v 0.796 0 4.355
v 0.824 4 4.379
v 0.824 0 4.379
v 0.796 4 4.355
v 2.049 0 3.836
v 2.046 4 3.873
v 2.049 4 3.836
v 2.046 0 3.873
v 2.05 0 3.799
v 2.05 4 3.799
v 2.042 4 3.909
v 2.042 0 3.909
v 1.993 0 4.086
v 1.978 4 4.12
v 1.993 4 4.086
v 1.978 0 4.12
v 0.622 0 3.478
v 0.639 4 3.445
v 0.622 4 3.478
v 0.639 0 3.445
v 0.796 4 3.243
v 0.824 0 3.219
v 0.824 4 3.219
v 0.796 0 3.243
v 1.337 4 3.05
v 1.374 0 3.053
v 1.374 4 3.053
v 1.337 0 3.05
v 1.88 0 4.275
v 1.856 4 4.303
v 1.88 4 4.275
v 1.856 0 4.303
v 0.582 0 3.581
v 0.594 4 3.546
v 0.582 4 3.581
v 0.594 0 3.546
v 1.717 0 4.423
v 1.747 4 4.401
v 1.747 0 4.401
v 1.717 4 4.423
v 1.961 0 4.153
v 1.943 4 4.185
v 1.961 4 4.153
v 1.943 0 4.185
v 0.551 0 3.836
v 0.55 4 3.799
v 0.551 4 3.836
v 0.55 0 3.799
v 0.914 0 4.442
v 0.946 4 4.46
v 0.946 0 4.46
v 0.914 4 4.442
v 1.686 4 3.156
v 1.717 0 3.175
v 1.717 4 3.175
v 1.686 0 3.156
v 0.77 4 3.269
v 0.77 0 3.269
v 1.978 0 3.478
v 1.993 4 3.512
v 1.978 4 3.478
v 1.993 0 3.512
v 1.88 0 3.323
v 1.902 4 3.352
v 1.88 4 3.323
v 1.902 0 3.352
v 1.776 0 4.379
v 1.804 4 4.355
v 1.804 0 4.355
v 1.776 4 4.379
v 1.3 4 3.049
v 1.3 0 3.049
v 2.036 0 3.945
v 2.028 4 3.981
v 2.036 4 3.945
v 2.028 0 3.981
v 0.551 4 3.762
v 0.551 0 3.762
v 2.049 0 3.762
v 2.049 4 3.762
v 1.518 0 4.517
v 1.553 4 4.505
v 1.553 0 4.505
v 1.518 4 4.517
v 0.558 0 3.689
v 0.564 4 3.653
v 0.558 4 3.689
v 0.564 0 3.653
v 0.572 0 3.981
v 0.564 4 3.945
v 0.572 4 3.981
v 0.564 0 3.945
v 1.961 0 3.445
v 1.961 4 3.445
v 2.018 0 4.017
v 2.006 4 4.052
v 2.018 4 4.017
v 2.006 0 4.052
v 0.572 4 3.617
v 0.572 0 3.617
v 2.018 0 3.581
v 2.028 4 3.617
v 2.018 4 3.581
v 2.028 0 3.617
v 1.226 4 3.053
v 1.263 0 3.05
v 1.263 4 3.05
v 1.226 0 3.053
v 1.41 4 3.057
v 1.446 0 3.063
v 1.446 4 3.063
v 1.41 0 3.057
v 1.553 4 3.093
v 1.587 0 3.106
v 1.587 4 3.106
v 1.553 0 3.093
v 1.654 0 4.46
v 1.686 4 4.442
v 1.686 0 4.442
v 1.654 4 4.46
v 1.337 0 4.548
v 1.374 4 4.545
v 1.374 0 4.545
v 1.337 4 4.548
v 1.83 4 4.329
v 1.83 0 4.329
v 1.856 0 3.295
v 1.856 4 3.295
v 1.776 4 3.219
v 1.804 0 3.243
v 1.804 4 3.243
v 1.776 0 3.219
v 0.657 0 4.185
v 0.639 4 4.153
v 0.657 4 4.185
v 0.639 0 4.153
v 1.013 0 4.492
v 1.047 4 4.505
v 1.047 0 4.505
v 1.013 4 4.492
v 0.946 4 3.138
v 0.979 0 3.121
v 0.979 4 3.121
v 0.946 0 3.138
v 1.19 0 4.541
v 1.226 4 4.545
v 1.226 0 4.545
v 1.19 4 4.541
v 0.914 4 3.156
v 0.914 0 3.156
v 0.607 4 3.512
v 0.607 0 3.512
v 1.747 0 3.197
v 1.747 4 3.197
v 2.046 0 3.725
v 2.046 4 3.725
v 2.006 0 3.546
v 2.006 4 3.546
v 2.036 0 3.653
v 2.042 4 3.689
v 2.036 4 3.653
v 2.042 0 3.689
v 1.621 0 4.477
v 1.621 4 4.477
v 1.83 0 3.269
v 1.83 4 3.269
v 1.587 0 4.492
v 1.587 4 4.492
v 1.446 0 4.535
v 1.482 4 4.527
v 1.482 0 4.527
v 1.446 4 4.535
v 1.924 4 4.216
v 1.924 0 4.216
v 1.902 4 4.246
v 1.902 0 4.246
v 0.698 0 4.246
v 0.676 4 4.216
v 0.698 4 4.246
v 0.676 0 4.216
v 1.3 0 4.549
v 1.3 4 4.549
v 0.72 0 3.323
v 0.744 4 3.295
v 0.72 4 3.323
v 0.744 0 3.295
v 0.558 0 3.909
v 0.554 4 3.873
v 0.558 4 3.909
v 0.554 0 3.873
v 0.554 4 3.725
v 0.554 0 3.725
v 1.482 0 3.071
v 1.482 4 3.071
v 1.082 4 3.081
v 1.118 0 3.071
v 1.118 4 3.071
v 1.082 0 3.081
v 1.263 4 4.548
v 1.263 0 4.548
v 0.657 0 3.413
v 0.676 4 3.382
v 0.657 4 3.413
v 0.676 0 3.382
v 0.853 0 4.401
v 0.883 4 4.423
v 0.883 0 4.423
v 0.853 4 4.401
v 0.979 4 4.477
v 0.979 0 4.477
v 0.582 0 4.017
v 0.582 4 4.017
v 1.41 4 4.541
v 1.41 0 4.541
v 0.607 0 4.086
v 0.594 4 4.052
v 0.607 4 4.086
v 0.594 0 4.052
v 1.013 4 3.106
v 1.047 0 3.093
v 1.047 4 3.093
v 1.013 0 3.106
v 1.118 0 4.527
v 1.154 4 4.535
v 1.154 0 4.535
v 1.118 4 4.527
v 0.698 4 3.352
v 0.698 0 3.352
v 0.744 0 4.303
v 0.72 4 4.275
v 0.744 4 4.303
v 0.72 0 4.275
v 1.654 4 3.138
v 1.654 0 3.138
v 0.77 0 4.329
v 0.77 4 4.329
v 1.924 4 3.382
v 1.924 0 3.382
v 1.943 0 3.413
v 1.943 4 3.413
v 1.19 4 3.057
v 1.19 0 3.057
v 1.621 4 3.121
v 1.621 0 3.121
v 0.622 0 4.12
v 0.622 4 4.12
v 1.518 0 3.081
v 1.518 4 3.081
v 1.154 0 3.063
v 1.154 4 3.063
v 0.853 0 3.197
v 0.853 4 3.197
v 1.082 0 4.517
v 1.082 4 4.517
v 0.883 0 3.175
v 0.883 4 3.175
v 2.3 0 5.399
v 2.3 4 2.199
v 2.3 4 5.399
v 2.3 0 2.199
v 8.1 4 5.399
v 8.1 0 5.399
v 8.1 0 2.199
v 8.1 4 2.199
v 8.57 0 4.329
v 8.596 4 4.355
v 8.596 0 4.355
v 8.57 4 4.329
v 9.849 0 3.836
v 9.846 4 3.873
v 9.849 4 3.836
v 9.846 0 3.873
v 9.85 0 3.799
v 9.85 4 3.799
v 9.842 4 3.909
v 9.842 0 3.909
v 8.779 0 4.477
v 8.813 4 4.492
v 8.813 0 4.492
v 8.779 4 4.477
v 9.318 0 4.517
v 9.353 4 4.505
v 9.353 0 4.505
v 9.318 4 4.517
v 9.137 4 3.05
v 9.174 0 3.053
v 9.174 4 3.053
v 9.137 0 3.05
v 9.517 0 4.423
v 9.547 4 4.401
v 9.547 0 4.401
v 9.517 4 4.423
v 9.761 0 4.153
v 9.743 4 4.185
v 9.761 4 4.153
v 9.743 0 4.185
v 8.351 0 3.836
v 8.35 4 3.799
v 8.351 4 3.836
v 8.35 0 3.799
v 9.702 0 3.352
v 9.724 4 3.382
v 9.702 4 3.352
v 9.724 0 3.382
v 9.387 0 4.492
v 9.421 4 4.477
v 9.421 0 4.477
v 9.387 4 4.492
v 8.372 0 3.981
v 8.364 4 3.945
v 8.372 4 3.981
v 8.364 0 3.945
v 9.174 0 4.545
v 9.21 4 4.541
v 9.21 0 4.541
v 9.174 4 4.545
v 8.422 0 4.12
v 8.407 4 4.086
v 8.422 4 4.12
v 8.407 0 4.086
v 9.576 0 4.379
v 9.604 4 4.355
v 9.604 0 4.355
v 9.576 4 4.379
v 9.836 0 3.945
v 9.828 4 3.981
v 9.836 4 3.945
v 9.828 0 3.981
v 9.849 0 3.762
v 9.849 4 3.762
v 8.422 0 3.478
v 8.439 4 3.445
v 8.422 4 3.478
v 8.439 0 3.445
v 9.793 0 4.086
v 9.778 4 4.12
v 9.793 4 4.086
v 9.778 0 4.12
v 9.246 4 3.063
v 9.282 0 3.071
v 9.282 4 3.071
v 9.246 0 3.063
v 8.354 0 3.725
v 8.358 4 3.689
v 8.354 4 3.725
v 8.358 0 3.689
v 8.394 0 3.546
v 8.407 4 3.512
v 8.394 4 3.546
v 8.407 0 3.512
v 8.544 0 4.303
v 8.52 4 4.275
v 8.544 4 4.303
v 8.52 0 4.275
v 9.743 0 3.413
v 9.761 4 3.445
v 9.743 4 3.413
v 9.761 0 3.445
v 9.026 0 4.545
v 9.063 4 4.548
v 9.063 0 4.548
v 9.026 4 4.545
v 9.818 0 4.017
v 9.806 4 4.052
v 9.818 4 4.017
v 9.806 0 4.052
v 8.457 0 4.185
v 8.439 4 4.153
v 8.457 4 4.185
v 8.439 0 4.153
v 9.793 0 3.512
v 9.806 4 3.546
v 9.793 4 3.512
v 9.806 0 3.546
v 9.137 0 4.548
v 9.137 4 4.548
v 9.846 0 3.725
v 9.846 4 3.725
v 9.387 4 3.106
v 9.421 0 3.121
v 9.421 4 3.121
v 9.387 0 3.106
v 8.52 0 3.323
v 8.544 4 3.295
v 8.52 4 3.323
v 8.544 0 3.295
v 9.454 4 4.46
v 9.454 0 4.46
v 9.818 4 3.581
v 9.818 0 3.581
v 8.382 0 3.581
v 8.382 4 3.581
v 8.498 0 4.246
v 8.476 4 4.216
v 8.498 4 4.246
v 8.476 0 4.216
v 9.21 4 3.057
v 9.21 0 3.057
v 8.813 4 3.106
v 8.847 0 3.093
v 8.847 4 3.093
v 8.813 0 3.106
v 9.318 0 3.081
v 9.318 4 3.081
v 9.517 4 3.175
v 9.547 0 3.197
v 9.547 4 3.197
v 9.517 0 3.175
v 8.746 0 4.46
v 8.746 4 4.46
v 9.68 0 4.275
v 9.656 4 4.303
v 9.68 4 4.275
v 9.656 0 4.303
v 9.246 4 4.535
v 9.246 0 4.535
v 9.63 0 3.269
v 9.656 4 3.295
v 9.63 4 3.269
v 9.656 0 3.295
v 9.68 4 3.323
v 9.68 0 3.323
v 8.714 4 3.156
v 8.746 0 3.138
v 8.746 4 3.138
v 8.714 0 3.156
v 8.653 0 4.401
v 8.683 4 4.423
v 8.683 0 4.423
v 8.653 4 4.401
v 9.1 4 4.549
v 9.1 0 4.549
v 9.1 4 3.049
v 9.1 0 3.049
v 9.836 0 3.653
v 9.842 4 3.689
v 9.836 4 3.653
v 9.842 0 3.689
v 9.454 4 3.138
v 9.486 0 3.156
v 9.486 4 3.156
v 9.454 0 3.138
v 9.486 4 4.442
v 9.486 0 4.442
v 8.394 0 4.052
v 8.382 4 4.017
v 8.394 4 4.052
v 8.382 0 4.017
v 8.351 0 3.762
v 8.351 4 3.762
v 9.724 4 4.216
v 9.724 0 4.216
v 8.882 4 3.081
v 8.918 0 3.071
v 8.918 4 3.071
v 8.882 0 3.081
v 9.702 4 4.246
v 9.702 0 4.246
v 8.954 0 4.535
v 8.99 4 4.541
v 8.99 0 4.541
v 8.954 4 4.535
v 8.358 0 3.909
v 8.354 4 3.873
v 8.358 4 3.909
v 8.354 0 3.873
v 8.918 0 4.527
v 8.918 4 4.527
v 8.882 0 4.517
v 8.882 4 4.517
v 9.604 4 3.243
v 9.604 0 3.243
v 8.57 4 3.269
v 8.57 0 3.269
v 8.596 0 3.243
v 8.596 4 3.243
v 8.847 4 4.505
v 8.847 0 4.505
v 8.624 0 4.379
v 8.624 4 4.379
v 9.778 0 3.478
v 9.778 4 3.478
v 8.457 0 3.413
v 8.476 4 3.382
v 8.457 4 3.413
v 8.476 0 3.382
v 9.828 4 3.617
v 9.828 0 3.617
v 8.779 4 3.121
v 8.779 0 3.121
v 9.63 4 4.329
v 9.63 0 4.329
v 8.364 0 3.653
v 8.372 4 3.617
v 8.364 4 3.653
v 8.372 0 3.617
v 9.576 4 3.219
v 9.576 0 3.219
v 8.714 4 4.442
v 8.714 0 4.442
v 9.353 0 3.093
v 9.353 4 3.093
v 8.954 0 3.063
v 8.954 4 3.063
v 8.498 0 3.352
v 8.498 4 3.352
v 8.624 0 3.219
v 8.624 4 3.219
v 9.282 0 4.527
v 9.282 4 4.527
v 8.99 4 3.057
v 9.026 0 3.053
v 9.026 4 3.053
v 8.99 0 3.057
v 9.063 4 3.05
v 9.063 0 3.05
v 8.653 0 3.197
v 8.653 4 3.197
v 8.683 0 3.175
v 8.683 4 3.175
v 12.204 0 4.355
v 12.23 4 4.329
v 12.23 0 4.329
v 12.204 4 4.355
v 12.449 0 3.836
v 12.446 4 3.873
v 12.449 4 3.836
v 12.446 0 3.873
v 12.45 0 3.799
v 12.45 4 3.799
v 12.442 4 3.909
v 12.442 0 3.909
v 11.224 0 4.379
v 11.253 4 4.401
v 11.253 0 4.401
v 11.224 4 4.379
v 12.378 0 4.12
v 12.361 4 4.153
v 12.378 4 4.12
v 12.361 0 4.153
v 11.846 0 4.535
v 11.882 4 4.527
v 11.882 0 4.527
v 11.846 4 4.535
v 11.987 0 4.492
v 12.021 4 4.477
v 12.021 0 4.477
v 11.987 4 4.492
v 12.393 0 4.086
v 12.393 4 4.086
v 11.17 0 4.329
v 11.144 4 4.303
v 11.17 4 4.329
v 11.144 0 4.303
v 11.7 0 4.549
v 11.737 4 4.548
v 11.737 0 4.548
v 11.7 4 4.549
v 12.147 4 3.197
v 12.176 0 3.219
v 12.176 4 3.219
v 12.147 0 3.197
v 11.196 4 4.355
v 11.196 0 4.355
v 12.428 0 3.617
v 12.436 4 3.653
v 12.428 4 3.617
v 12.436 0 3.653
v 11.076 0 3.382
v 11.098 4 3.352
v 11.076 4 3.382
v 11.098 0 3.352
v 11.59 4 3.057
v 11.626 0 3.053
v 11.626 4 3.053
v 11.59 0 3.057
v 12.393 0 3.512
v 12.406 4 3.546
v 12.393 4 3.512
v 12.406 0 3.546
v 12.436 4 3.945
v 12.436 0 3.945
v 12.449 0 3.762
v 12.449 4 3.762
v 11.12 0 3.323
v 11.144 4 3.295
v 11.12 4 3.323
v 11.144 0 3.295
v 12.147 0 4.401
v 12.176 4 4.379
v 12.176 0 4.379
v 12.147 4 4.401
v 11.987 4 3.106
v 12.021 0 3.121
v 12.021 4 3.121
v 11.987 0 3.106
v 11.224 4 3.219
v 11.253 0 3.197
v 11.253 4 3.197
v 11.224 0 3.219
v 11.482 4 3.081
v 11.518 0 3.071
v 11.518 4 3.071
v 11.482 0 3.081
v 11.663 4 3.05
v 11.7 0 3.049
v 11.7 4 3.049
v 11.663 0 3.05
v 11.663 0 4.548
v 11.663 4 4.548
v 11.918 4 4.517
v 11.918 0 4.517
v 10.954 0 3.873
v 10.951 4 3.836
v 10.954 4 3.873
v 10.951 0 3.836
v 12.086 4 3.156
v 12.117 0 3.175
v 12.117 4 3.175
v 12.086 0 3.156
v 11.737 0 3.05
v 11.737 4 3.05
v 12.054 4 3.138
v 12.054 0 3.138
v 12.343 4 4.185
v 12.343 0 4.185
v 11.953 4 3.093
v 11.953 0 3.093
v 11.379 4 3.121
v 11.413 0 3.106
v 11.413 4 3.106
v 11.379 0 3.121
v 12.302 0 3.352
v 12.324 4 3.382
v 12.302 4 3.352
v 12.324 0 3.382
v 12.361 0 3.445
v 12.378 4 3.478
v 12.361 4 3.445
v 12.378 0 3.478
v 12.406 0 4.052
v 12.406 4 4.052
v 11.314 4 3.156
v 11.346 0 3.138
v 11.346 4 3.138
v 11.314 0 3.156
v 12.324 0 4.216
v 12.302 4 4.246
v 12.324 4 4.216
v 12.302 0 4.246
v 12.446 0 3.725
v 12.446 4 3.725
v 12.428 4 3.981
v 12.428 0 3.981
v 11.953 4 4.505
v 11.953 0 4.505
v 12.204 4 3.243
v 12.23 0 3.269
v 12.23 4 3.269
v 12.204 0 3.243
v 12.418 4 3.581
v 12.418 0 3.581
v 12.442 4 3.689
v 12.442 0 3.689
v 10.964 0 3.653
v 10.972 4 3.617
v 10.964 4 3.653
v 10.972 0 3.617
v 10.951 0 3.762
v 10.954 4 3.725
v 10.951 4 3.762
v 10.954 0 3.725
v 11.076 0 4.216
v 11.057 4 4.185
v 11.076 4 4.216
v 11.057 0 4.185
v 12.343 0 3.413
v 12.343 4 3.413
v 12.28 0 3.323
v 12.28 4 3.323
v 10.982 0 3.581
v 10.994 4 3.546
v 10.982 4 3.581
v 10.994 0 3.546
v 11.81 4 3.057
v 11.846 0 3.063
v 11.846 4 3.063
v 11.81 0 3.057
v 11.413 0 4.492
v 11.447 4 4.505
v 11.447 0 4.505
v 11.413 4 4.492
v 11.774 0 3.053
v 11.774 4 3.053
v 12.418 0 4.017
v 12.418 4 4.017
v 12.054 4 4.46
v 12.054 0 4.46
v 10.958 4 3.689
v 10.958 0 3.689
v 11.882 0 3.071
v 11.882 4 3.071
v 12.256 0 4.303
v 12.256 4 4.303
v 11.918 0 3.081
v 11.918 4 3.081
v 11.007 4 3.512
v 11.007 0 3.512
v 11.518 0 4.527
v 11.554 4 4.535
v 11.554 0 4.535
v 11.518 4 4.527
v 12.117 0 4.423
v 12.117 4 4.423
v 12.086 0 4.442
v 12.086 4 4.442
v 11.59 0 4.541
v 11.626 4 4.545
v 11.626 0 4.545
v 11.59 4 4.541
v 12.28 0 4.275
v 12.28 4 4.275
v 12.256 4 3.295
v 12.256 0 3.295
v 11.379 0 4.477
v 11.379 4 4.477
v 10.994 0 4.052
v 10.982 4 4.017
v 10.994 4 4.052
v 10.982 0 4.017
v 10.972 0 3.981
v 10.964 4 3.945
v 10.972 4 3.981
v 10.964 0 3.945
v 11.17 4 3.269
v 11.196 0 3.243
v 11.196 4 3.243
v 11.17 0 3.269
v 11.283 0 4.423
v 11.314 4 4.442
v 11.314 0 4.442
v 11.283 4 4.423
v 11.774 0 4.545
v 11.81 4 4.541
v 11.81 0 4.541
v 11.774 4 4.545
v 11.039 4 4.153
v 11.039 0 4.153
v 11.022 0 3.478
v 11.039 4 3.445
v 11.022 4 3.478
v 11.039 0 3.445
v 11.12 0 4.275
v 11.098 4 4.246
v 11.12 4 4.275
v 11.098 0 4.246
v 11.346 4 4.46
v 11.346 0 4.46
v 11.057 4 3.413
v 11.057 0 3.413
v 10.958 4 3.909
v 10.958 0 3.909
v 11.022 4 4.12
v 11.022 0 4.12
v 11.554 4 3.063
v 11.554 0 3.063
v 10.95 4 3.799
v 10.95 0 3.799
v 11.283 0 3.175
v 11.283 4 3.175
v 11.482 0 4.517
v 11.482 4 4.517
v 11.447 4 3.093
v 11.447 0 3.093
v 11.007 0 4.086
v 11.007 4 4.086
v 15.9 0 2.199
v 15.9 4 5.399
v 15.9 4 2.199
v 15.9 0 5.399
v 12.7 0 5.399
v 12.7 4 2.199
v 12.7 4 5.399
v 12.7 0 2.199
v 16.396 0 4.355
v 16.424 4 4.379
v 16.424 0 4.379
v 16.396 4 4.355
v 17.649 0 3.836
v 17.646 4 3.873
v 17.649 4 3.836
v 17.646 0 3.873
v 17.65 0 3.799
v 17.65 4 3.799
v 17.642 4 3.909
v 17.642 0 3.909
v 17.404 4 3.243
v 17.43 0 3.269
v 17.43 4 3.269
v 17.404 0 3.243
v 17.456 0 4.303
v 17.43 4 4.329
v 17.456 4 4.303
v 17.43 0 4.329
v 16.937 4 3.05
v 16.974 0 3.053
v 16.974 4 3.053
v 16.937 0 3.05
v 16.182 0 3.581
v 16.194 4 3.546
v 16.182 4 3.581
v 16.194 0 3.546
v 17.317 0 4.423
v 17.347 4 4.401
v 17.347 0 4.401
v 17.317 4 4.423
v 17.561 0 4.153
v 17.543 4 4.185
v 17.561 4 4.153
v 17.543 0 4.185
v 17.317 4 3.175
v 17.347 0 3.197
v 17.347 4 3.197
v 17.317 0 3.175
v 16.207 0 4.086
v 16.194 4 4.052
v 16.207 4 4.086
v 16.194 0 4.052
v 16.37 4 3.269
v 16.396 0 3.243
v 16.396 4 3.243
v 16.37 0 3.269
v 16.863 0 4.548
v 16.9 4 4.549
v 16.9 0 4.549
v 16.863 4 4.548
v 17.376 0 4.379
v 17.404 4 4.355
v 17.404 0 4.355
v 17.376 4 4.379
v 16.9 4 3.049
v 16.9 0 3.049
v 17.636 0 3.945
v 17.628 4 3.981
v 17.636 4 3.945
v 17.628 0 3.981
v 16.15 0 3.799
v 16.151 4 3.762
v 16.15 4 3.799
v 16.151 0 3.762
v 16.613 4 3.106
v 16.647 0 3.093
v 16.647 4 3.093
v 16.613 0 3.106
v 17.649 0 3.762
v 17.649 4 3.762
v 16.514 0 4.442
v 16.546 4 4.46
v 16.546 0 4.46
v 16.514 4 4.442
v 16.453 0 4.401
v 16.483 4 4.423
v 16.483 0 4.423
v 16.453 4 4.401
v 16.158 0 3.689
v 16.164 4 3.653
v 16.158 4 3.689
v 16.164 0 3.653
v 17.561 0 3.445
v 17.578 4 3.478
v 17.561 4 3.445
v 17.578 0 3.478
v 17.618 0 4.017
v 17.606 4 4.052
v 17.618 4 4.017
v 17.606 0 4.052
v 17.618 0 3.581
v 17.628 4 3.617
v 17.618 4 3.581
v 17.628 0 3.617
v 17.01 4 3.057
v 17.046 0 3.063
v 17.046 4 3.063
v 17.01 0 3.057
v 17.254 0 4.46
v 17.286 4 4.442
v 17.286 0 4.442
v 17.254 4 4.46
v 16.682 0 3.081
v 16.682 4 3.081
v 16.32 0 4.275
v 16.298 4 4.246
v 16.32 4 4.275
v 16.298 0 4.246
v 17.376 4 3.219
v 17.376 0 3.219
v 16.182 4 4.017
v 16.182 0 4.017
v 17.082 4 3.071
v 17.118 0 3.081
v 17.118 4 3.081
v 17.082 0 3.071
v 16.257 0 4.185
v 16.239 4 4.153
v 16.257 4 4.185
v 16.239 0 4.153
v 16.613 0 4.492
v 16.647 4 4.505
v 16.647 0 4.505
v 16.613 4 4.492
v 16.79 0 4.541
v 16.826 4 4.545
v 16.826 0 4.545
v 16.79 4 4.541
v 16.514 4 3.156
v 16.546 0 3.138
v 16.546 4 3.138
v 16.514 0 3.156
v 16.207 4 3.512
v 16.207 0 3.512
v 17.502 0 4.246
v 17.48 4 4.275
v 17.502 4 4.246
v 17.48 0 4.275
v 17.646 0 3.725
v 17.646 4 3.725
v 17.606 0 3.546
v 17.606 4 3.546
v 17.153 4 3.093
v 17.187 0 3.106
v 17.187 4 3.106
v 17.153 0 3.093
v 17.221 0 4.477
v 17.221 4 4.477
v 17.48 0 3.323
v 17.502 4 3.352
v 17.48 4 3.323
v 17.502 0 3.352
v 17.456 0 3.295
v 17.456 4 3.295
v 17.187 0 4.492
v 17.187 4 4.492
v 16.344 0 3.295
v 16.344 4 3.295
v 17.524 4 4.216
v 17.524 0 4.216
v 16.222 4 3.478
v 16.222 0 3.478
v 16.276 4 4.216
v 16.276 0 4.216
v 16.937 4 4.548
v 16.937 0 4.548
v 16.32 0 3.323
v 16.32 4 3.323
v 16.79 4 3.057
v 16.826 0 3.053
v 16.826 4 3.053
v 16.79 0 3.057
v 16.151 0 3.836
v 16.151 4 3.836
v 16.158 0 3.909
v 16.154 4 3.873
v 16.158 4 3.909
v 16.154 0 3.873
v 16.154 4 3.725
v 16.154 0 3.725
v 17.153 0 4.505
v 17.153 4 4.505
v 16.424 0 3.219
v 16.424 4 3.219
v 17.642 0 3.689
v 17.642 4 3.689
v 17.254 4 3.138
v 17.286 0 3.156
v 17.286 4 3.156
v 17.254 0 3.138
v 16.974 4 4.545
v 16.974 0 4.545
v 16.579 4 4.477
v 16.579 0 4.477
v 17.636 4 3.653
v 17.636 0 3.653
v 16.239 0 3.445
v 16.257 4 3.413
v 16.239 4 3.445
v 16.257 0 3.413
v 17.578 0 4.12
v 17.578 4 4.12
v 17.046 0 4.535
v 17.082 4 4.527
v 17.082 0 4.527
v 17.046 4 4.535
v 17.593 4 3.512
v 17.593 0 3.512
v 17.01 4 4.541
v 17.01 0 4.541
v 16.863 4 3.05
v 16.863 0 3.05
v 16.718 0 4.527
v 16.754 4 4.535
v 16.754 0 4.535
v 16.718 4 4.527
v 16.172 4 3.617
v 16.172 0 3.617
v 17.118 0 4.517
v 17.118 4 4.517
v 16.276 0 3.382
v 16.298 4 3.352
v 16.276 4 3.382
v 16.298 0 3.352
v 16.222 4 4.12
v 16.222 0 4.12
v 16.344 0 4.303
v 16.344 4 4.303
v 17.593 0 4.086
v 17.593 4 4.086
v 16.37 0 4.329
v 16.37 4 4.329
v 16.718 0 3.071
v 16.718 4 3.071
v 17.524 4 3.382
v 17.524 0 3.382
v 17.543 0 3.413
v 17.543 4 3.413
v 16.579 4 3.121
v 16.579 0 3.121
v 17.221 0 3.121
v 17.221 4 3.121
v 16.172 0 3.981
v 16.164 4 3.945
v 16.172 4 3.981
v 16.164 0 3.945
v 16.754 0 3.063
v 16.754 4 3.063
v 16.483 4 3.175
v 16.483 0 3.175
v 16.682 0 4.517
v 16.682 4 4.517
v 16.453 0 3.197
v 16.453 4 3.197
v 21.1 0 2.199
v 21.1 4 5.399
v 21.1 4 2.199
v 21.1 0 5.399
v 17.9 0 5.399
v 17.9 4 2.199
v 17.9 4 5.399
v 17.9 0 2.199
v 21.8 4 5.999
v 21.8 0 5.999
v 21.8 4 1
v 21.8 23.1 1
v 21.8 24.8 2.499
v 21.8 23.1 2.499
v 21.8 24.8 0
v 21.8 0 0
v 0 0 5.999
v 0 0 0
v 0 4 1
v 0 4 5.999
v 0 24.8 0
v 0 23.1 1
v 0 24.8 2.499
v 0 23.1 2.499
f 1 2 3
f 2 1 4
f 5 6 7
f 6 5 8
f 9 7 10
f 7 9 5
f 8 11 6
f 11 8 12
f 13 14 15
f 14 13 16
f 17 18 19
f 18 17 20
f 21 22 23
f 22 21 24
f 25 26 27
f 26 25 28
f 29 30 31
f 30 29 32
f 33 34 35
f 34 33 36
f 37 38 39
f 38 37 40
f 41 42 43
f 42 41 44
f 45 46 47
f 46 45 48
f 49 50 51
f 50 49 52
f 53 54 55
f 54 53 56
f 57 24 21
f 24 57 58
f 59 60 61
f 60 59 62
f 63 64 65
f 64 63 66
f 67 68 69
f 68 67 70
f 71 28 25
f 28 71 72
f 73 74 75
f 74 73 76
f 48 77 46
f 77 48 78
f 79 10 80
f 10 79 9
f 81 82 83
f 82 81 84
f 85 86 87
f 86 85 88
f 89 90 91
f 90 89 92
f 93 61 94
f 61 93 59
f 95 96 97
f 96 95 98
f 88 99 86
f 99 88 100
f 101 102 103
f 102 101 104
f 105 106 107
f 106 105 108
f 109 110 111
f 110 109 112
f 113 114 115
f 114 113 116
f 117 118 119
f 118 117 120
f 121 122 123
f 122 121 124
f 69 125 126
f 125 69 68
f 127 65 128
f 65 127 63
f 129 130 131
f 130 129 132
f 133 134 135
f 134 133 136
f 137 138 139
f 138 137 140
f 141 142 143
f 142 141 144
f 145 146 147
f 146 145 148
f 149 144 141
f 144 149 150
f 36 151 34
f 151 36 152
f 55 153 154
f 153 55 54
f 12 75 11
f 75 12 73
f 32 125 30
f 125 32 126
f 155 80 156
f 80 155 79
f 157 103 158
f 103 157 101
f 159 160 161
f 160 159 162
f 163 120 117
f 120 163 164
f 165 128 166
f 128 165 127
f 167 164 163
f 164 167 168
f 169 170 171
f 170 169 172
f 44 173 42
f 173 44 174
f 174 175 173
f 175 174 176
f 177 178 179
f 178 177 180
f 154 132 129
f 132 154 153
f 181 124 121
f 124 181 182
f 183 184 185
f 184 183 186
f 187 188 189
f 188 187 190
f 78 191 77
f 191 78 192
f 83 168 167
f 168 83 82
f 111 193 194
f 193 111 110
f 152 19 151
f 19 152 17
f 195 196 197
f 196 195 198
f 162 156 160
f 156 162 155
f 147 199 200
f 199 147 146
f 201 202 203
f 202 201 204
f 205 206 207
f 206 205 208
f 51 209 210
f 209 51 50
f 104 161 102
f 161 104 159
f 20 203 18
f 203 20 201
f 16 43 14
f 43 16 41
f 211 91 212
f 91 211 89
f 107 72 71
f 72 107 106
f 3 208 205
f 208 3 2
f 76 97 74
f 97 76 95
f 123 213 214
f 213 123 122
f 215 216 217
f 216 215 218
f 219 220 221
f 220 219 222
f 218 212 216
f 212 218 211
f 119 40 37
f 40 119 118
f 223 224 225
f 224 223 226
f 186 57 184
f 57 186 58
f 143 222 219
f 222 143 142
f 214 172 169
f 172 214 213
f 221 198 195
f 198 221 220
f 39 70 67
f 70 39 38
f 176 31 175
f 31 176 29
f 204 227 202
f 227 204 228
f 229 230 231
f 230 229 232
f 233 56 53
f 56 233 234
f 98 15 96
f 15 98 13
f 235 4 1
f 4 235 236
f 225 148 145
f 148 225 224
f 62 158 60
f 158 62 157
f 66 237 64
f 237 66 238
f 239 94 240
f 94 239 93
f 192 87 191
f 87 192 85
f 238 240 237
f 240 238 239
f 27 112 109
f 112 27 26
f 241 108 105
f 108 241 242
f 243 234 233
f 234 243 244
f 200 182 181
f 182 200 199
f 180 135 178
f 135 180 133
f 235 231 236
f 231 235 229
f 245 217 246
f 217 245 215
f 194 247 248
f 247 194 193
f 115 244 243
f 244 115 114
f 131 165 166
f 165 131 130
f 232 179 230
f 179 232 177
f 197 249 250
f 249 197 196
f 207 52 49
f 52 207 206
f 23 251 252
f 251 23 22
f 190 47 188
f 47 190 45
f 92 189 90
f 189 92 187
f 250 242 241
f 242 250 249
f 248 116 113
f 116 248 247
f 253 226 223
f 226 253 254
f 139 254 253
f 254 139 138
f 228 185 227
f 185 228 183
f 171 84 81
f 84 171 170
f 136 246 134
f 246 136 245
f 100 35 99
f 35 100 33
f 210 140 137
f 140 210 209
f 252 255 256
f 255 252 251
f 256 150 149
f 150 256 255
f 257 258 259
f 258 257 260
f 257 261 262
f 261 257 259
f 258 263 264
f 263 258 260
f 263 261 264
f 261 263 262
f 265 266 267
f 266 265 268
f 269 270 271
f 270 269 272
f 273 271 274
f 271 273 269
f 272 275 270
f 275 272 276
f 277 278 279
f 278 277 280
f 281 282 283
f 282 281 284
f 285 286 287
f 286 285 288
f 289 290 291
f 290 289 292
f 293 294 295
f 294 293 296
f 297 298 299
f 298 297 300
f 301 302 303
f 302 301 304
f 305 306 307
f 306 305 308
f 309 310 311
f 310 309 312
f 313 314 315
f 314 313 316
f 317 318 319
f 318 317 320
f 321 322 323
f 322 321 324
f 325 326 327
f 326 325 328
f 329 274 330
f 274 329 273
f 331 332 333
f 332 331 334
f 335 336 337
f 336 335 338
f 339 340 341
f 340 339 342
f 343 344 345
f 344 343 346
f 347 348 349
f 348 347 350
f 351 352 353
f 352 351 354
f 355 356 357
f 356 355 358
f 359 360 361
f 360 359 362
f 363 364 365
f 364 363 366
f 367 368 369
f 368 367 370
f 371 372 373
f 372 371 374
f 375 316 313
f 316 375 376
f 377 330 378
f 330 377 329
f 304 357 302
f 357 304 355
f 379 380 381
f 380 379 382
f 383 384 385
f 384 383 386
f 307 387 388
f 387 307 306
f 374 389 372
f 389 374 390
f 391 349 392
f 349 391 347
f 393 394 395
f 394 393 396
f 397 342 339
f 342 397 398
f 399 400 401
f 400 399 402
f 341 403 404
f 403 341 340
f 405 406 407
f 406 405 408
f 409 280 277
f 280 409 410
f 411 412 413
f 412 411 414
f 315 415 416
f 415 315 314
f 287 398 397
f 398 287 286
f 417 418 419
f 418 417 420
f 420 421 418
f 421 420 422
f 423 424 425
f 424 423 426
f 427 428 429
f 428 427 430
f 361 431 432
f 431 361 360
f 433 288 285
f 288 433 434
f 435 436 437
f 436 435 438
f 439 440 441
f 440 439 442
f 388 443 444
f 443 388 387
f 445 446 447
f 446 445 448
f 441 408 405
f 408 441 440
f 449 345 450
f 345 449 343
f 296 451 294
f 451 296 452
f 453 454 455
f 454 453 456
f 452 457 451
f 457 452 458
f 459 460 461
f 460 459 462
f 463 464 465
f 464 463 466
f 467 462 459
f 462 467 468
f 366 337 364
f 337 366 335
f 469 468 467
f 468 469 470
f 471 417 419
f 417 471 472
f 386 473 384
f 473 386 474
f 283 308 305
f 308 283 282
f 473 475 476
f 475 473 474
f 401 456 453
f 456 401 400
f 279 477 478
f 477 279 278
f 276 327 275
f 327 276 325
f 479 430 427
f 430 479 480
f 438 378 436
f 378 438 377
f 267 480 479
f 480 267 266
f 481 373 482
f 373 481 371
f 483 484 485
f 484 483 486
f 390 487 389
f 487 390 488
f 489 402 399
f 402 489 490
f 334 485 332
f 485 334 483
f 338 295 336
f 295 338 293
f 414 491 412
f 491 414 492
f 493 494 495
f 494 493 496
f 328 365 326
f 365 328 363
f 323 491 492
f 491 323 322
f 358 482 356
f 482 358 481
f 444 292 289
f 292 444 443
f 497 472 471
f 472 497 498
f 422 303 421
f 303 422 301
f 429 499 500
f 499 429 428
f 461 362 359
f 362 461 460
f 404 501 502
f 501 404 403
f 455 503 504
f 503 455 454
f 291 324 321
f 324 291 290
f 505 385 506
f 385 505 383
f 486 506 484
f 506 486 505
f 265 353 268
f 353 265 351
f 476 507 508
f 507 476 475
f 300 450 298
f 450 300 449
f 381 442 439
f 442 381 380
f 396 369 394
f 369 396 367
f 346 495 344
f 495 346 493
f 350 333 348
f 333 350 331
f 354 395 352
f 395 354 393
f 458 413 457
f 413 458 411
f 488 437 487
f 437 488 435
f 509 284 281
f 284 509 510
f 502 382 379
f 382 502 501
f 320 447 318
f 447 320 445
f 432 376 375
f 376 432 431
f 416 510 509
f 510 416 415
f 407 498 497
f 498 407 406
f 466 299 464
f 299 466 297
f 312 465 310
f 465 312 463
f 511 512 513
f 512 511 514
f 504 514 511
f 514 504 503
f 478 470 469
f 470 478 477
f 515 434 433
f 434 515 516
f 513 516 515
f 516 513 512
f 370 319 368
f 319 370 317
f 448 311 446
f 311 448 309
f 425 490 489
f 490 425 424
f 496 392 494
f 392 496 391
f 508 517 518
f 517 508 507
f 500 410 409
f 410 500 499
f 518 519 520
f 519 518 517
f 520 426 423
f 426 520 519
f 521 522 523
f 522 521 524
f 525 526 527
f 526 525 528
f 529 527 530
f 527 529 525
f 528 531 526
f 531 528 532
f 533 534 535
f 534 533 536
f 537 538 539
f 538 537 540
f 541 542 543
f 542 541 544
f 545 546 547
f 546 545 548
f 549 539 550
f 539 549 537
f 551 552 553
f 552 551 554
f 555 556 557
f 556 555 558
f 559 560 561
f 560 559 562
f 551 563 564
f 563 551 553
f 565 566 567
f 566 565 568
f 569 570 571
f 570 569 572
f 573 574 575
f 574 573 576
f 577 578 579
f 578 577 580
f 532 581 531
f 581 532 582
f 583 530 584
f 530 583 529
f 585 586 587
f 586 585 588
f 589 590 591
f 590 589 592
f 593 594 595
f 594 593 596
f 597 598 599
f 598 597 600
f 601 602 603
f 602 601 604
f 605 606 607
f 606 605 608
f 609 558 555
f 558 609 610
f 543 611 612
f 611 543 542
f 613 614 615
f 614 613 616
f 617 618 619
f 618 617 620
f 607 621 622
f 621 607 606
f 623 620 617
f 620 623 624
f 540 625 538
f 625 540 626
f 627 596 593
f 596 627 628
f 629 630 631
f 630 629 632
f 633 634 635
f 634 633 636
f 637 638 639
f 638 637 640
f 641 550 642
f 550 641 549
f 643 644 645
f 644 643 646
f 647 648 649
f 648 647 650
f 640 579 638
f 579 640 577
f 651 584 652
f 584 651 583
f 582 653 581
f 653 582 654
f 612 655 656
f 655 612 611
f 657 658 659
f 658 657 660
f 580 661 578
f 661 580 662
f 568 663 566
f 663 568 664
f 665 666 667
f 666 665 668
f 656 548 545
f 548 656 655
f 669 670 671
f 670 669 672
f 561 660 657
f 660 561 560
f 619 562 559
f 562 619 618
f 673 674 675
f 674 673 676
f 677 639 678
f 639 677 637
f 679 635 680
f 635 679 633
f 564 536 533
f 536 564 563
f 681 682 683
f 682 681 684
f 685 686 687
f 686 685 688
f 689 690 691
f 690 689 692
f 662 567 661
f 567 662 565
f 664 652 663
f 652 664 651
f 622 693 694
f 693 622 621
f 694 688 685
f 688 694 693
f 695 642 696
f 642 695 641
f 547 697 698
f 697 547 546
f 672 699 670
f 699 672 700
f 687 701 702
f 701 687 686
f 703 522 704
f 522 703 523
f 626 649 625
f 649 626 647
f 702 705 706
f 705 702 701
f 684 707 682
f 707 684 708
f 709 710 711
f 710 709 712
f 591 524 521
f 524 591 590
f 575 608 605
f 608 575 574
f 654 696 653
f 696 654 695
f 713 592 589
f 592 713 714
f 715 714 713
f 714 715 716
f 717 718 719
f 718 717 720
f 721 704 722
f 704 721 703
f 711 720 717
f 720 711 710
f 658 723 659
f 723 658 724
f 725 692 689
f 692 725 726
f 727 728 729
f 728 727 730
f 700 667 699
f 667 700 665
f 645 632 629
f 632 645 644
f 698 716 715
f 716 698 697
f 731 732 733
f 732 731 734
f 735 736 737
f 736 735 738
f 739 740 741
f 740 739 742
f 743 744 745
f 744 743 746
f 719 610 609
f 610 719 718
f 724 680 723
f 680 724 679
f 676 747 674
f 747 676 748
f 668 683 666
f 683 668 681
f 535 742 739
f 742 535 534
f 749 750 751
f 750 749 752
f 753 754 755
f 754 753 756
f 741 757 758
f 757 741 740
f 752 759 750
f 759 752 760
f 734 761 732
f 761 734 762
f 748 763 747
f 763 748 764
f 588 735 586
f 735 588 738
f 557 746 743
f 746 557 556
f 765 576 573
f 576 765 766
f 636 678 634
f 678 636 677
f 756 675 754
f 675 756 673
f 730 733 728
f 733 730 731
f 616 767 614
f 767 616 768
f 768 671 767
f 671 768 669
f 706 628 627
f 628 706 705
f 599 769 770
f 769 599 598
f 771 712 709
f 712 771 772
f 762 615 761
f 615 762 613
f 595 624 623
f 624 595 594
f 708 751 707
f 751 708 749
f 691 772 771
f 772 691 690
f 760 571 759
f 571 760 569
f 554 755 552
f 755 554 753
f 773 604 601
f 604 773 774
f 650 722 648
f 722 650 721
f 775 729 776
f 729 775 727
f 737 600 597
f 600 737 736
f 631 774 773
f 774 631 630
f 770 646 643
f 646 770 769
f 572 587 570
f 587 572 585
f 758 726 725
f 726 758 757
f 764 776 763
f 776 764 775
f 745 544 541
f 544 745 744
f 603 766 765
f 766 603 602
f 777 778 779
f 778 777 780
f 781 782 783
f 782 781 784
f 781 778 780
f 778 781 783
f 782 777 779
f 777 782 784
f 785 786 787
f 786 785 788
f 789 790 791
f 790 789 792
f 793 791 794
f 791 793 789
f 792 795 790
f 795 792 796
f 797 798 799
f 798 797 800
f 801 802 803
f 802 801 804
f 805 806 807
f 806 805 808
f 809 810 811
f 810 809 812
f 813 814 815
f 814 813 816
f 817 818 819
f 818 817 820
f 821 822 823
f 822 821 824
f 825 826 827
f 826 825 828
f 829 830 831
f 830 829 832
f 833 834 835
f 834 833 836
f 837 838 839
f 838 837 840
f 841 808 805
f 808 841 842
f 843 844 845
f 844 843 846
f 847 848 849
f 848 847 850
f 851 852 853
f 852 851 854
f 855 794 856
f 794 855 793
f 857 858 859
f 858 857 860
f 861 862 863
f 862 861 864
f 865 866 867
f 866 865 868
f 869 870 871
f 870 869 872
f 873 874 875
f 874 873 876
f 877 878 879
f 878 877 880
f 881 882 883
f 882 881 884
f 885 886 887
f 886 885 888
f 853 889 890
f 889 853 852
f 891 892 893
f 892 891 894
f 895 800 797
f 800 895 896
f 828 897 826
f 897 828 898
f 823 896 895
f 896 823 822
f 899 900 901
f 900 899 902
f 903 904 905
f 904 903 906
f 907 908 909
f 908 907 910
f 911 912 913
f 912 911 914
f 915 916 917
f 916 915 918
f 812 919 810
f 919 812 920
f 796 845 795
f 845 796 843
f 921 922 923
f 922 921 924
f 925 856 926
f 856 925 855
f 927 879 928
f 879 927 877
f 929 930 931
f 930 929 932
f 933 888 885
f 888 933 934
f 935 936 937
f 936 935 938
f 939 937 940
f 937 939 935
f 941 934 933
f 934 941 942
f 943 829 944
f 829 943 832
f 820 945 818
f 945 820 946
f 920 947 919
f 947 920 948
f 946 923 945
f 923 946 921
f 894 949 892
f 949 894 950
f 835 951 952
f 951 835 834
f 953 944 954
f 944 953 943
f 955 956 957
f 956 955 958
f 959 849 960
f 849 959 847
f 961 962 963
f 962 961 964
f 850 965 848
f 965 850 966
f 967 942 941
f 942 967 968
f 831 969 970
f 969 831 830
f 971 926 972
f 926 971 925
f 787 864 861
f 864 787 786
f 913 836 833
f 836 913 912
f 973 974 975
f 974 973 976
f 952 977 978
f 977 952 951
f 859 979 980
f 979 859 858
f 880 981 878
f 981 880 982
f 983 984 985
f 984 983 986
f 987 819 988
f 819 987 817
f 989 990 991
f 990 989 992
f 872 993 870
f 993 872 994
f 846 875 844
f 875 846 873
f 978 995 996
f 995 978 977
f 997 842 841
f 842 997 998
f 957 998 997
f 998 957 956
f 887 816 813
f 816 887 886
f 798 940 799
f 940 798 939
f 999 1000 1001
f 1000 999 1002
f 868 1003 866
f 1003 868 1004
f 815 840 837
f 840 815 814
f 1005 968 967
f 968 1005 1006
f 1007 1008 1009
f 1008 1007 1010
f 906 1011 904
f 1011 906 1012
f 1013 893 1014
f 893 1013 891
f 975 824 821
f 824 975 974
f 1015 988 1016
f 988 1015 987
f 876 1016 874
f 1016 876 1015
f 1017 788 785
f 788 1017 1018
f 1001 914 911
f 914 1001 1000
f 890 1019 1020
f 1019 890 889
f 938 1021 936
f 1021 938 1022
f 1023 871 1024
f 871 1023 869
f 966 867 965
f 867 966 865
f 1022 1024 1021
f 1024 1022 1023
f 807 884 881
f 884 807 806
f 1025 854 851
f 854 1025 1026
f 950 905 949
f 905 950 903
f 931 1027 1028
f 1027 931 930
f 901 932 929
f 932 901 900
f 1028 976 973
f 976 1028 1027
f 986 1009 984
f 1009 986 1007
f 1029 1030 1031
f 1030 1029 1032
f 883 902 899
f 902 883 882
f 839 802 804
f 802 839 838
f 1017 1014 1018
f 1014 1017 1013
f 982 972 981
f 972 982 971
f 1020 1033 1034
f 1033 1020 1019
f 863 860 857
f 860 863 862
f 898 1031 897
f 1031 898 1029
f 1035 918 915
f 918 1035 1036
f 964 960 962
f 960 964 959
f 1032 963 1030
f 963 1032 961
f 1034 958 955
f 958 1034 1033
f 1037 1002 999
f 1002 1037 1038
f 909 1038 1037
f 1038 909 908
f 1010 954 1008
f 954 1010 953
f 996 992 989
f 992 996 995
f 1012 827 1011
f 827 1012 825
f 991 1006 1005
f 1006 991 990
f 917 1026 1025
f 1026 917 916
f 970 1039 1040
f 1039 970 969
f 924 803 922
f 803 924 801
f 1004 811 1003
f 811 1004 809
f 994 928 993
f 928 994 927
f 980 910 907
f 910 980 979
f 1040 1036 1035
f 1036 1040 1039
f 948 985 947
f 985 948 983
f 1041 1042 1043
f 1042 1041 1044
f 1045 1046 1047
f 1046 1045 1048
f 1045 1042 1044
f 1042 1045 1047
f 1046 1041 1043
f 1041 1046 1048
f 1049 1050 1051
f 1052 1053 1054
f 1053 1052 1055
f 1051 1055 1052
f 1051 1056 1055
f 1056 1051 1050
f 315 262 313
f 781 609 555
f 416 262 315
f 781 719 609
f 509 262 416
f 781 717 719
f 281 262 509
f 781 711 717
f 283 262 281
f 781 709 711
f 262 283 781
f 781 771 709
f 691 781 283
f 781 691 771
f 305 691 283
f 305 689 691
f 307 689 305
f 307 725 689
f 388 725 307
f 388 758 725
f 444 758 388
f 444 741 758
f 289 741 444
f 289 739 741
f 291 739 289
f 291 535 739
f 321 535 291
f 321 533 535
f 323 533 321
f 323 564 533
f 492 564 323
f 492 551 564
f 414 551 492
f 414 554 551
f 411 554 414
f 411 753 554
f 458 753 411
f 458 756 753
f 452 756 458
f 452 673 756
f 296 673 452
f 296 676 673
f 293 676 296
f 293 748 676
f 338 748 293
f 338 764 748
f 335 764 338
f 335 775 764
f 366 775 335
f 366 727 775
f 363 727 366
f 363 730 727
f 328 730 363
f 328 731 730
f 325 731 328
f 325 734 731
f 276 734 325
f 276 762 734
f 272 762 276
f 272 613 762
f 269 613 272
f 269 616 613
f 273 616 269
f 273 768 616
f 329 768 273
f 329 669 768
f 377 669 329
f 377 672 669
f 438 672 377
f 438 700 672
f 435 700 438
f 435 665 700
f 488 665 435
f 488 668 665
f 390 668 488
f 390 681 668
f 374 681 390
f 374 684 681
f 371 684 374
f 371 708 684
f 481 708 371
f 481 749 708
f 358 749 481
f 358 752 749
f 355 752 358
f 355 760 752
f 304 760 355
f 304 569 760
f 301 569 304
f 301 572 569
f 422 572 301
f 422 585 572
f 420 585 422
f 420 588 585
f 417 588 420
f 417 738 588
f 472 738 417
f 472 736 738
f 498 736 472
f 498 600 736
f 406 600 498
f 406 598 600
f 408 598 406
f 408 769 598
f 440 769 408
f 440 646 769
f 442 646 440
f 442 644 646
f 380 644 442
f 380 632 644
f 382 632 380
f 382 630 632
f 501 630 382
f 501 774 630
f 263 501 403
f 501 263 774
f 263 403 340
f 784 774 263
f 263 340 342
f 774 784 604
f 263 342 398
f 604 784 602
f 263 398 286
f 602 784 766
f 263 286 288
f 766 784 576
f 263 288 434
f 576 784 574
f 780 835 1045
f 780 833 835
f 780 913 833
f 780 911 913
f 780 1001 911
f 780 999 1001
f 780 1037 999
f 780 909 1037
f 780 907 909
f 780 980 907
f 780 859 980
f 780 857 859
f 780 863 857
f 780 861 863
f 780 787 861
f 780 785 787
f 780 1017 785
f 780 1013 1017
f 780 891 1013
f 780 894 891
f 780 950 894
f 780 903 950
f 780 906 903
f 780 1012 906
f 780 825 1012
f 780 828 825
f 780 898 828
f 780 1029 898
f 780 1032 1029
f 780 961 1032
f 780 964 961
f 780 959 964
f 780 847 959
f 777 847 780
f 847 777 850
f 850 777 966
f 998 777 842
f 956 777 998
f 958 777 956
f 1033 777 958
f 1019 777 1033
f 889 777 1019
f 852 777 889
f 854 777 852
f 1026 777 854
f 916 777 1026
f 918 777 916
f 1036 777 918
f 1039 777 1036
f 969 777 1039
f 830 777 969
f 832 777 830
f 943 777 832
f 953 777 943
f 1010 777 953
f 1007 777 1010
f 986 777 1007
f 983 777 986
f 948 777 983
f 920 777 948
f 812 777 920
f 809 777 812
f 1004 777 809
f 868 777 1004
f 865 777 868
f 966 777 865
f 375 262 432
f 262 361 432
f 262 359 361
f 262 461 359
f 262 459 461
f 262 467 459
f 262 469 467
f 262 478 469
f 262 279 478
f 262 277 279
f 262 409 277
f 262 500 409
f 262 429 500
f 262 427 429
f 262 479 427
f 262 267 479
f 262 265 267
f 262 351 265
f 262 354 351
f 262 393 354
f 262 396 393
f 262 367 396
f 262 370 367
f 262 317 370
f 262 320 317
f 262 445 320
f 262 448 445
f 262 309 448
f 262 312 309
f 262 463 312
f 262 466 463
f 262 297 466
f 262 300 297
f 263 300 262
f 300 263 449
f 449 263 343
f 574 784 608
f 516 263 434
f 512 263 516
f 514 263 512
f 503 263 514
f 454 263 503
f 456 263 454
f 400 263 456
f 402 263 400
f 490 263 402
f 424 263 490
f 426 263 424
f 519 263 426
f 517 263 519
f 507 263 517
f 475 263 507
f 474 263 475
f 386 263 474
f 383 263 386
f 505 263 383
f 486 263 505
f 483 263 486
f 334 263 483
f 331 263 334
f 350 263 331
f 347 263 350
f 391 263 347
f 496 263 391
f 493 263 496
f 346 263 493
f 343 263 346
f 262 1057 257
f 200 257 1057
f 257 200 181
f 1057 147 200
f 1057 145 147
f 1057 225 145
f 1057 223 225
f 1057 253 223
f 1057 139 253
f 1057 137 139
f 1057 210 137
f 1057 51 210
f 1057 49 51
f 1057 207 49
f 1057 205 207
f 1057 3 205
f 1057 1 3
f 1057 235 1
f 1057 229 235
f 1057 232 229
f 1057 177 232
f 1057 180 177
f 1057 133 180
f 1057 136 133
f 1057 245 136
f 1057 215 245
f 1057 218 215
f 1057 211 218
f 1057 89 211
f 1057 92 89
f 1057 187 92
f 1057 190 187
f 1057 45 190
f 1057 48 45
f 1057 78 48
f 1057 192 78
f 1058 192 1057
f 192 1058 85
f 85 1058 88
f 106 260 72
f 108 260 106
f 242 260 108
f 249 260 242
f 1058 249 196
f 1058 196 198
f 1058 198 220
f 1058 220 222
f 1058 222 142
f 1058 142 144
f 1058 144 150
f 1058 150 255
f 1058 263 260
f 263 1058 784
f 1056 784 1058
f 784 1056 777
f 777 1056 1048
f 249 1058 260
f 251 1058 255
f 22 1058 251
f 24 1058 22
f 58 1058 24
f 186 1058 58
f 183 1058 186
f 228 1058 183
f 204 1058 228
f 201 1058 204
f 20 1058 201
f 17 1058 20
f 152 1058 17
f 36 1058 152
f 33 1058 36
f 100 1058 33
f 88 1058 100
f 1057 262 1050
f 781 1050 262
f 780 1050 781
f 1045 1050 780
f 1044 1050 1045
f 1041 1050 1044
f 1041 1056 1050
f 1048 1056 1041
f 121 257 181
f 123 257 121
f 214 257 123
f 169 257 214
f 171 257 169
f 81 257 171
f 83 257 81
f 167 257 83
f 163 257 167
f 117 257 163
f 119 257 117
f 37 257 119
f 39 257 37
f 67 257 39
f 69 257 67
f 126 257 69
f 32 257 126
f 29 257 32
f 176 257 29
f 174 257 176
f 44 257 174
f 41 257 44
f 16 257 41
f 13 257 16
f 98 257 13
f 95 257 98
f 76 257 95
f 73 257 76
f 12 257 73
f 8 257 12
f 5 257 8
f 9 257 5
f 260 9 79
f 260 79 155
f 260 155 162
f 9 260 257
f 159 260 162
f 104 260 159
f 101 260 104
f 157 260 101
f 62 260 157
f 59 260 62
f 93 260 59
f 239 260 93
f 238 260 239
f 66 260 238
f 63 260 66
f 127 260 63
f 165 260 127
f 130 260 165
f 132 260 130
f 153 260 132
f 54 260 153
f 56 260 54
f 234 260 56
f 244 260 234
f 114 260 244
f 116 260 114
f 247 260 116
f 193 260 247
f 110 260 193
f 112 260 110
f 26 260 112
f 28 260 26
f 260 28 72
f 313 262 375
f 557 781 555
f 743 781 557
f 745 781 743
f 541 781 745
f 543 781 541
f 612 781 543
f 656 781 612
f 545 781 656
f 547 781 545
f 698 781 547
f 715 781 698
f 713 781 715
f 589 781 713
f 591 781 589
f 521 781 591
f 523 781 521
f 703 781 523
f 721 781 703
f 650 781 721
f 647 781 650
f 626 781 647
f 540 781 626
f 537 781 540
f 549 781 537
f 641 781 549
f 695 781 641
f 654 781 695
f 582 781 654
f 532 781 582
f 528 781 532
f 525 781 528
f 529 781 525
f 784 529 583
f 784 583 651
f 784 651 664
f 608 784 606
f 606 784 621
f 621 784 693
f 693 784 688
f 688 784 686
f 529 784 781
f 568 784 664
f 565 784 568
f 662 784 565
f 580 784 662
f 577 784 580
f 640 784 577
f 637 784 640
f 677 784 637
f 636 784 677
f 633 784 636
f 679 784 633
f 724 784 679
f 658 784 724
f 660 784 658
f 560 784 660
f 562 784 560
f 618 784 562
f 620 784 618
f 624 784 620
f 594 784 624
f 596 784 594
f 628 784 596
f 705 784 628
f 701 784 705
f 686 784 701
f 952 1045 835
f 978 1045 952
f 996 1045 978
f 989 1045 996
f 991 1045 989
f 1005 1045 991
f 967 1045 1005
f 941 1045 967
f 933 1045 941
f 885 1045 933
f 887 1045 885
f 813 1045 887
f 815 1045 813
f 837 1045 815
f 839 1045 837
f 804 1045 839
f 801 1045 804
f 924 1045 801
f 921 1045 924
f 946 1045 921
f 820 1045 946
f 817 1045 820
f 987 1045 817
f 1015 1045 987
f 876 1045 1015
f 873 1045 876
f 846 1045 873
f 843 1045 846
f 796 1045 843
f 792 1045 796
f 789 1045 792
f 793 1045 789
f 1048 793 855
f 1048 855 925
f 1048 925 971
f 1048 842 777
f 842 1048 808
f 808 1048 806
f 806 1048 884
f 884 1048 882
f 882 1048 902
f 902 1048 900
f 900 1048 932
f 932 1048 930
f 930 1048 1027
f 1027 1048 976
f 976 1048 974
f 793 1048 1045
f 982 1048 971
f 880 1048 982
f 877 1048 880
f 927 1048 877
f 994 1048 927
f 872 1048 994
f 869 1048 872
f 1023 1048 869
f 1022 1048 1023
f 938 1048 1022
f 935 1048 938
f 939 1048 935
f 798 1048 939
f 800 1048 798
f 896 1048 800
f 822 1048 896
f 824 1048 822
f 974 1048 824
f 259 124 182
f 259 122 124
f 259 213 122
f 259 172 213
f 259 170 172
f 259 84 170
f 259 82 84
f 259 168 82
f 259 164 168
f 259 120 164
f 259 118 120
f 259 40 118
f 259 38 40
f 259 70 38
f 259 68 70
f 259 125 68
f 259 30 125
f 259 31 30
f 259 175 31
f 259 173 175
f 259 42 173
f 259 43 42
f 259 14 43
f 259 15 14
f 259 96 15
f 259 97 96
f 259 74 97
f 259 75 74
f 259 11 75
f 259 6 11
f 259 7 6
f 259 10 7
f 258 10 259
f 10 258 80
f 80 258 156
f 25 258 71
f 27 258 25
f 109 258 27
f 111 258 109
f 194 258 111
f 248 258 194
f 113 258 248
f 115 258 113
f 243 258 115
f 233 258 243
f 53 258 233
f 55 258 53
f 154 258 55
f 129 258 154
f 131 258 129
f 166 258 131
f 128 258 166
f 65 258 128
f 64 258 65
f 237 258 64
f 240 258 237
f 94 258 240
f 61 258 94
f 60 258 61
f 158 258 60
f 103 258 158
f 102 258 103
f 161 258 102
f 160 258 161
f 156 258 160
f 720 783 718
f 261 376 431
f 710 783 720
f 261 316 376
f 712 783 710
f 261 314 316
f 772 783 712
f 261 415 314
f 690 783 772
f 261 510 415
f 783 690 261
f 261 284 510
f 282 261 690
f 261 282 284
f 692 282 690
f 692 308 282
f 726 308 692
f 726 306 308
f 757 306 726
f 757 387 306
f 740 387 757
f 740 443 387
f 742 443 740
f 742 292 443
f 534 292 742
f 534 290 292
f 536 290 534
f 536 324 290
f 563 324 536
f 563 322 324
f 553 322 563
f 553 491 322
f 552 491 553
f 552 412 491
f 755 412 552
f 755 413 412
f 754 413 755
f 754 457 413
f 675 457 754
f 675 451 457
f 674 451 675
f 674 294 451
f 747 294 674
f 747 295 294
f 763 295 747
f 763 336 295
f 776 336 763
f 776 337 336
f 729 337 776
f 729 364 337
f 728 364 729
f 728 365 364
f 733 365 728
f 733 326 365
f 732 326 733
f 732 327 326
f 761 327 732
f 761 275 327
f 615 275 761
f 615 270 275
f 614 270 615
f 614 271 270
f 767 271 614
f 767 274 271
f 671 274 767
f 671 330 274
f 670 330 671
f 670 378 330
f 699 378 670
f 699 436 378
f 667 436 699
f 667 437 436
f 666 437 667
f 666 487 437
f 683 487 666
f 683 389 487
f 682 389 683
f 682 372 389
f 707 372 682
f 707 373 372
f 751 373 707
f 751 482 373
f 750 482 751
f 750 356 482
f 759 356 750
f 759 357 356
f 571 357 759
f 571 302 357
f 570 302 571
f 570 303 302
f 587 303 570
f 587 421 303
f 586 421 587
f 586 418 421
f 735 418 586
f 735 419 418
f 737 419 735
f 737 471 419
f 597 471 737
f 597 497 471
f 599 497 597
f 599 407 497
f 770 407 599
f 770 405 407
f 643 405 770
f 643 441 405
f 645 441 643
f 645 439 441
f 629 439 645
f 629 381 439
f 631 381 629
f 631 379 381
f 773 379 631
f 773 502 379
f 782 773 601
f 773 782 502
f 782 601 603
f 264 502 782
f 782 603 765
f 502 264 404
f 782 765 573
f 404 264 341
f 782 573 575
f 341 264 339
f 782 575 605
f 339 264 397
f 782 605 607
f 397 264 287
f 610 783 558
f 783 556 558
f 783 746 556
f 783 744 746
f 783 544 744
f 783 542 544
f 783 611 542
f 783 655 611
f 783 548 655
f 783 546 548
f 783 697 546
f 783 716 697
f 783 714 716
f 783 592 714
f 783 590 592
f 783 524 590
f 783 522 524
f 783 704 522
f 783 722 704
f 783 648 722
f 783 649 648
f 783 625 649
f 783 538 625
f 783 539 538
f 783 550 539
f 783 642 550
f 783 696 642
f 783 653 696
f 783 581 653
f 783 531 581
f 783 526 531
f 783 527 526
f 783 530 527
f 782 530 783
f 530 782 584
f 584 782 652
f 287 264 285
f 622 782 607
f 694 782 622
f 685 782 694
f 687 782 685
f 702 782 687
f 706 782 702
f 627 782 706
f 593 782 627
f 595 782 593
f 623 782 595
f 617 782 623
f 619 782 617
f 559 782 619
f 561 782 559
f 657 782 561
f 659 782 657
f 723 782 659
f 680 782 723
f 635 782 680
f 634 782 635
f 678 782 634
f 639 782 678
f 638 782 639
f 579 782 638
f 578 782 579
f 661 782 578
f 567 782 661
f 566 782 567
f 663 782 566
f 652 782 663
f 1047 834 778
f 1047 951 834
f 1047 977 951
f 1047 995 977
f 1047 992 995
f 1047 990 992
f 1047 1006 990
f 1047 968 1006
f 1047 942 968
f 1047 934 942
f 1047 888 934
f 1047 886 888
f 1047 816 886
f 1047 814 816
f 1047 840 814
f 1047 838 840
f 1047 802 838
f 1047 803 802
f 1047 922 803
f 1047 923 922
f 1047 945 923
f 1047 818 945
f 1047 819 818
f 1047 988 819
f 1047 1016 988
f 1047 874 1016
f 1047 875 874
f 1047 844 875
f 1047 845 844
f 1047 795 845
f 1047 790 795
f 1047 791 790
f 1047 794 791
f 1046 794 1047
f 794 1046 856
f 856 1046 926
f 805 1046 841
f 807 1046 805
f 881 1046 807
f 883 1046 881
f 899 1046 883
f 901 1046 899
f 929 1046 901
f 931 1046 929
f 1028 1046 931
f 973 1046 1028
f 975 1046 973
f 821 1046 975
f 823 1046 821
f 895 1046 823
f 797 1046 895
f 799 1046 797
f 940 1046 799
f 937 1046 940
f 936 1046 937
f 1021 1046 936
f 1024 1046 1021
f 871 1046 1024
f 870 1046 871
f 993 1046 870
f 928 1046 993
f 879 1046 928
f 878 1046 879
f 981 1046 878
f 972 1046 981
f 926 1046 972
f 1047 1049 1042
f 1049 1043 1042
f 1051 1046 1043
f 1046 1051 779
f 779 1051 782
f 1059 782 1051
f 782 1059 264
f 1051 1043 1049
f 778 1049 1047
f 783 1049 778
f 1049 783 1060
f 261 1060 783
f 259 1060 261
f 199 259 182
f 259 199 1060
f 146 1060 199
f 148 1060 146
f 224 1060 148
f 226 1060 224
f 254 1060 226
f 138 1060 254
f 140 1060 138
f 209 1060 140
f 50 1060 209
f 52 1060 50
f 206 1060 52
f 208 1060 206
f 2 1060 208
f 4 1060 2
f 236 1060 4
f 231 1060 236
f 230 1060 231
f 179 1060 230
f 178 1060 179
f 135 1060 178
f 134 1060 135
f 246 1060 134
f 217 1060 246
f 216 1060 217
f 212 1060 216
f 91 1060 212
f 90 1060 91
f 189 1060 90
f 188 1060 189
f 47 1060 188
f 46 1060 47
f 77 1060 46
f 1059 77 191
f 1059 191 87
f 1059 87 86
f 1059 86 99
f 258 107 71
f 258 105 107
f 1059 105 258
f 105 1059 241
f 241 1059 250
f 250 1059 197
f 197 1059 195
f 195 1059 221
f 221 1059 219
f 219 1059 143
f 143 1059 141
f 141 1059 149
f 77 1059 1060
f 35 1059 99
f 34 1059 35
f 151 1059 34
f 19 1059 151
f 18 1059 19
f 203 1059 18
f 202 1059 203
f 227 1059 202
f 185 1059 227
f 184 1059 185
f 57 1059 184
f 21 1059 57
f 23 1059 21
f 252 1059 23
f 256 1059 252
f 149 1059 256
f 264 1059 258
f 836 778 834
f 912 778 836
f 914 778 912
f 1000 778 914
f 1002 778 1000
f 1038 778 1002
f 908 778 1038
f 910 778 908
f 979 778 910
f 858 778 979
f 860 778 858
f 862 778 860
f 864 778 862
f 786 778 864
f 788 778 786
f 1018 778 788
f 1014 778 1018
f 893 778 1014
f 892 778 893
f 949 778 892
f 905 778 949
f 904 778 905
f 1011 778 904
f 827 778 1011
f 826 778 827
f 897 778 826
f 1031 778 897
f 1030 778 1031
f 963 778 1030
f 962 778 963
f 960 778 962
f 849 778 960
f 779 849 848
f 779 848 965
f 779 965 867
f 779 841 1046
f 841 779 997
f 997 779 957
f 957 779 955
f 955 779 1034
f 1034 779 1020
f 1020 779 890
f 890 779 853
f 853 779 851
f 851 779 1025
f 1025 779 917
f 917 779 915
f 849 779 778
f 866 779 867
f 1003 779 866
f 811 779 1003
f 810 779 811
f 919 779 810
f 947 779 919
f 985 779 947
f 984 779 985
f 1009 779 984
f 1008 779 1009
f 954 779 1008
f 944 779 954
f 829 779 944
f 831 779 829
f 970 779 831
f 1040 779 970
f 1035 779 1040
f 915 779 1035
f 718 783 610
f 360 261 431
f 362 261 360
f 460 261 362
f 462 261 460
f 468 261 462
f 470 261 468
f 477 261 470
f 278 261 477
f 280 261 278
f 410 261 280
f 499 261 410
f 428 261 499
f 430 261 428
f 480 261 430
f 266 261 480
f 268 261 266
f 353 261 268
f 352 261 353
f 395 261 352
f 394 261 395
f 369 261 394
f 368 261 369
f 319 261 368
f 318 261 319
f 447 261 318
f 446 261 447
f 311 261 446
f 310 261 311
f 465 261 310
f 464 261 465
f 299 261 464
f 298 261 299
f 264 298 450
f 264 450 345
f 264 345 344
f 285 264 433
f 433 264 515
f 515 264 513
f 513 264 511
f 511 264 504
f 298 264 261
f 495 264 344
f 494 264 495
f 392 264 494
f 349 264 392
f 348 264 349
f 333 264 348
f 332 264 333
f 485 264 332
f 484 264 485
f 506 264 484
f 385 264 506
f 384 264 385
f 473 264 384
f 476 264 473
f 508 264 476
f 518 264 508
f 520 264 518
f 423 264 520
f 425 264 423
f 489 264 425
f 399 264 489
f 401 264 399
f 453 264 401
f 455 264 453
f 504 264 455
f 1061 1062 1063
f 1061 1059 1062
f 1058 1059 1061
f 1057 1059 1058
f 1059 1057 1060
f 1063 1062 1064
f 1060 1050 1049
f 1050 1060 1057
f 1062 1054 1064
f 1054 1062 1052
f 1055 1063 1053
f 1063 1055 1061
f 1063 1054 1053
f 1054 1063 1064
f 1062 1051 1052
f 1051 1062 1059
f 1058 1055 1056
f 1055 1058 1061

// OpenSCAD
$fn = 128;

// plastic part of male plugs at the end of cables
plug_width = 2.6;
plug_length = 12; 

thickness = 1;
height = 4;
fit = 0.2;

// distance from edge of poe hat board to first pins
edge_width = 1.5;

// thickness of poe hat circuit board
board_thickness = 1.7;

// top of poe hat board to bottom of rpi board
assembly_width = 18.9;


module pin_clip(pattern=[0,1,1,0,0,1,0,1]) {
    echo("width:", plug_width * len(pattern));
    left_margin = pattern[0] == 0 ? 0 : 1;
    right_margin = pattern[len(pattern) - 1] == 0 ? 0 : 1;
    part_width = plug_width * len(pattern) + left_margin + right_margin;
    translate([
        0,
        thickness - 0.001,
        0
    ]) {
        difference() {
            cube([
                part_width,
                plug_width + thickness*2 + (edge_width - thickness) - 0.1,
                height,
            ]);
            
            for (i = [0:len(pattern) - 1]) {
                if (pattern[i] == 0) {
                    // round holes for free pins
                    translate([
                        plug_width/2 + plug_width * i + left_margin,
                        plug_width/2 + edge_width,
                        -0.001
                    ])
                    cylinder(r=0.75, h=10);
                } else {
                    // rectangular hole for plug
                    translate([
                        plug_width * i - fit*1.5 + left_margin,
                        edge_width - fit*1.5,
                        -0.001
                    ])
                    cube([
                        plug_width + fit*3,
                        plug_width + fit*3,
                        10
                    ]);
                }
            }
        }
        
        // bottom clip
        translate([
            0,
            0,
            -assembly_width - board_thickness - fit,
        ])
        cube([
            part_width,
            edge_width,
            board_thickness
        ]);
    }

    // back plate
    color([0,1,1])
    translate([
        0,
        0,
        -assembly_width - board_thickness - fit
    ])
    cube([
        part_width,
        thickness,
        assembly_width + height + board_thickness + fit,
    ]);
}

translate([0, height, 0])
rotate([90, 0, 0])
pin_clip();
